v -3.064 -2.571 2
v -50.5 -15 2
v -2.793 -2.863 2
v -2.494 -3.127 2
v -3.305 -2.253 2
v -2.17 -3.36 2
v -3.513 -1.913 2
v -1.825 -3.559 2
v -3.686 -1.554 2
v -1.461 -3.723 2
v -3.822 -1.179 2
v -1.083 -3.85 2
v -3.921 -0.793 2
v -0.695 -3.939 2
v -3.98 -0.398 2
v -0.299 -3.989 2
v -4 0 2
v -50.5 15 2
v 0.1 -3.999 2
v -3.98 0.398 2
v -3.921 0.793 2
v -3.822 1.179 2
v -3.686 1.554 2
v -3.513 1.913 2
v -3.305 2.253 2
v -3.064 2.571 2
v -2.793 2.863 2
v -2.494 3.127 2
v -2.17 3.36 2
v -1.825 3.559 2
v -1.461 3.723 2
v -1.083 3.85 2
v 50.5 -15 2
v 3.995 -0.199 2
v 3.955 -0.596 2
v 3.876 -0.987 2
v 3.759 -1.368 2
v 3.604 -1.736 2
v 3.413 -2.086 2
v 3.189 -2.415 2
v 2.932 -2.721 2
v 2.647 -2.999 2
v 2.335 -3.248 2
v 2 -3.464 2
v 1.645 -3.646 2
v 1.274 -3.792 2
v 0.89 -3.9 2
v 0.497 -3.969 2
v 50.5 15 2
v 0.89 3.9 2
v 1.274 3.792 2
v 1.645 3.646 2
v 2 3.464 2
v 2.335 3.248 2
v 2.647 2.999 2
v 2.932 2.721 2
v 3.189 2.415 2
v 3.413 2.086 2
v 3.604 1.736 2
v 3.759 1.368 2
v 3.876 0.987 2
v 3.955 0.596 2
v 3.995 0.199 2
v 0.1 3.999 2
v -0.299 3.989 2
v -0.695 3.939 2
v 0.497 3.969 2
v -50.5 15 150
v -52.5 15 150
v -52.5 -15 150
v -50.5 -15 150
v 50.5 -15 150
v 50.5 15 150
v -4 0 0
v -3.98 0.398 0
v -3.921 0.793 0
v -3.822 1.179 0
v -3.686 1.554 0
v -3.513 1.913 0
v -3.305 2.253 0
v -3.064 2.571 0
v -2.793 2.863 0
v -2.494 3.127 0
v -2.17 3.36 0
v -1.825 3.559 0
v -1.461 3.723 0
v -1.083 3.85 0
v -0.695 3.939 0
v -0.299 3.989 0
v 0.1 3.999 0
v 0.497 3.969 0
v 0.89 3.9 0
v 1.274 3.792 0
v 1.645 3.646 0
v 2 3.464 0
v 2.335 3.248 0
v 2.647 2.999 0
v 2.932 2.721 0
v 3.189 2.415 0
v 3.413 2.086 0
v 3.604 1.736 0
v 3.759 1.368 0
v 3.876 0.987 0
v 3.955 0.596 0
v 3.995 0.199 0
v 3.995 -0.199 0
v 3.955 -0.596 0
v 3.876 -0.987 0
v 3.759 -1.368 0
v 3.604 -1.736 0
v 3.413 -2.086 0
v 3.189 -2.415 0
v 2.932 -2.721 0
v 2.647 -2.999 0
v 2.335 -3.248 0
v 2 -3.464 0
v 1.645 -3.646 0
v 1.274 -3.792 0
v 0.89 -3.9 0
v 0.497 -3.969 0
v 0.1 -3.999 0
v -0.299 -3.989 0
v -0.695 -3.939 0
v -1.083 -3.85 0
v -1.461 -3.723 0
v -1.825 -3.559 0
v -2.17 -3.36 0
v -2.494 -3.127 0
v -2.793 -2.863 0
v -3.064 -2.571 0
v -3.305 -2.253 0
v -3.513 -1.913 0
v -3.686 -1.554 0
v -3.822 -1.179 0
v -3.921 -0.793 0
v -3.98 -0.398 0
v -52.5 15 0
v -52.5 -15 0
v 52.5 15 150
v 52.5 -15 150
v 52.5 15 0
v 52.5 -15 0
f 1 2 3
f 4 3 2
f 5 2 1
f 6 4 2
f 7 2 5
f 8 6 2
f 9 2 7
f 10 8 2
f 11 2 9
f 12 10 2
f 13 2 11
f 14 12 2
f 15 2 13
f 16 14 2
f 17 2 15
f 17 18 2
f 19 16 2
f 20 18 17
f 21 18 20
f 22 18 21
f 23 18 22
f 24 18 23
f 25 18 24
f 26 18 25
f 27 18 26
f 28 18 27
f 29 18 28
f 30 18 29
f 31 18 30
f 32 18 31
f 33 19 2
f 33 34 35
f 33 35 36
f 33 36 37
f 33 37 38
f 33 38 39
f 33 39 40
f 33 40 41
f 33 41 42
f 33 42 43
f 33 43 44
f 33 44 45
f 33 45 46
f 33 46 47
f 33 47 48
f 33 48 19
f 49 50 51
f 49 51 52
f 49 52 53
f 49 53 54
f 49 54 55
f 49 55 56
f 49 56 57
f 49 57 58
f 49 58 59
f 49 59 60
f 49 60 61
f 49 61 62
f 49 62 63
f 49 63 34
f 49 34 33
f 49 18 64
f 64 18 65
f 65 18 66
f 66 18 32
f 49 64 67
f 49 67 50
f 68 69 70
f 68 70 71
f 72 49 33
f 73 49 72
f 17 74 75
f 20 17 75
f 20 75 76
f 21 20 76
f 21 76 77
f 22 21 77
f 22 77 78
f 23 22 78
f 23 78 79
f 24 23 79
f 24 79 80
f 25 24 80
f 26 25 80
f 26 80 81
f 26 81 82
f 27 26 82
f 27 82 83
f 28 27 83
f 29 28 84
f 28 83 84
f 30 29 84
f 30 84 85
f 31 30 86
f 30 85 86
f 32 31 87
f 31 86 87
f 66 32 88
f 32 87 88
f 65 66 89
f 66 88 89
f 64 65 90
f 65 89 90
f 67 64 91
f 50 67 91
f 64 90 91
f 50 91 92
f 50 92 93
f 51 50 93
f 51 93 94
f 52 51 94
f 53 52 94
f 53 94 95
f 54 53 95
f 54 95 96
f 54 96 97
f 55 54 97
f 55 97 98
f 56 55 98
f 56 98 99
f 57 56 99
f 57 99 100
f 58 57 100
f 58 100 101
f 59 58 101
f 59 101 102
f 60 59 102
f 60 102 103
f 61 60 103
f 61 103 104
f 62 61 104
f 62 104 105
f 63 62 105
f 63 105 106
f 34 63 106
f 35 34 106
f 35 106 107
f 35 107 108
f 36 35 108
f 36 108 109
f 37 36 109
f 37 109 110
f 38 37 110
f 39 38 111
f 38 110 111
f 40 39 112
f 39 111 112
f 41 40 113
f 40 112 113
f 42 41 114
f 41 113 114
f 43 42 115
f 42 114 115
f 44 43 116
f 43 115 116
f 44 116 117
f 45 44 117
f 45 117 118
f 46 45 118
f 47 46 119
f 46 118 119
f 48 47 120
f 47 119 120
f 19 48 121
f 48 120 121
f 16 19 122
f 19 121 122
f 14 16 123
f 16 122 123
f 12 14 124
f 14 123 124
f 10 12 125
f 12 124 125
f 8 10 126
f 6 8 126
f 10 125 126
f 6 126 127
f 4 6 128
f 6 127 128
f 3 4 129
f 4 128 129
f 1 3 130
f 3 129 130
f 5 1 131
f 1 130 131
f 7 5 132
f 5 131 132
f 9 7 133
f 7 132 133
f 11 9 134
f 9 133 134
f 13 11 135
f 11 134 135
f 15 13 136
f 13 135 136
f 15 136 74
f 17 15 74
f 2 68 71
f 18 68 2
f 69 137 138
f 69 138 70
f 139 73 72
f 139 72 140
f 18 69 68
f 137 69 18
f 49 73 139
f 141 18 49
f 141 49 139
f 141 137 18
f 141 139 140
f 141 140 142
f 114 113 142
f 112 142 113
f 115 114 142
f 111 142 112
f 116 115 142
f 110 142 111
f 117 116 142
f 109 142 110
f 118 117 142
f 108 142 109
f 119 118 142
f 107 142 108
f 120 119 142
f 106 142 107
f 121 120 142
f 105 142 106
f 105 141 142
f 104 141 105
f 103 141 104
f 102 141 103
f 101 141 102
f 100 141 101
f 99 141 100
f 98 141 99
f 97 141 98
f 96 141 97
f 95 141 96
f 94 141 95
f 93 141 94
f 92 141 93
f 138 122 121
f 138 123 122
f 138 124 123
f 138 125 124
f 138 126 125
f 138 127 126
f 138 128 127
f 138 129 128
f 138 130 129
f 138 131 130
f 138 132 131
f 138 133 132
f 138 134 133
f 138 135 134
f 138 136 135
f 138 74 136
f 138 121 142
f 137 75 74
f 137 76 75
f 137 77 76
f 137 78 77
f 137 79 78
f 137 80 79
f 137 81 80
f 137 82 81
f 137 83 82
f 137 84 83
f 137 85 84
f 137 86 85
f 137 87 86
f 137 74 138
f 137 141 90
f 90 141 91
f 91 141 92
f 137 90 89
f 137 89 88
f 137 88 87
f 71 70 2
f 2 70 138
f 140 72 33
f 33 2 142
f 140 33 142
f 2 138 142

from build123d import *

# Parameters (mm, degrees)
BOSS_EXTRUDE1_DEPTH = 15
SKETCH2_R           = 4
CUT_EXTRUDE1_DEPTH  = 160.628474903


with BuildPart() as part:
    # Sketch1 → Boss-Extrude1 (new, symmetric)
    with BuildSketch(Plane(origin=(0, 0, 0), x_dir=(1, 0, 0), z_dir=(0, 1, 0))):
        Polygon((50.5, -2), (50.5, -150), (52.5, -150), (52.5, 0), (-52.5, 0), (-52.5, -150), (-50.5, -150), (-50.5, -2), align=None)
    extrude(amount=BOSS_EXTRUDE1_DEPTH, both=True)

    # Sketch2 → Cut-Extrude1 (cut, through all)
    with BuildSketch(Plane(origin=(0, 0, 0), x_dir=(-1, 0, 0), z_dir=(0, 0, -1))):
        Circle(SKETCH2_R)
    extrude(amount=-CUT_EXTRUDE1_DEPTH, mode=Mode.SUBTRACT)


solid = part.part
